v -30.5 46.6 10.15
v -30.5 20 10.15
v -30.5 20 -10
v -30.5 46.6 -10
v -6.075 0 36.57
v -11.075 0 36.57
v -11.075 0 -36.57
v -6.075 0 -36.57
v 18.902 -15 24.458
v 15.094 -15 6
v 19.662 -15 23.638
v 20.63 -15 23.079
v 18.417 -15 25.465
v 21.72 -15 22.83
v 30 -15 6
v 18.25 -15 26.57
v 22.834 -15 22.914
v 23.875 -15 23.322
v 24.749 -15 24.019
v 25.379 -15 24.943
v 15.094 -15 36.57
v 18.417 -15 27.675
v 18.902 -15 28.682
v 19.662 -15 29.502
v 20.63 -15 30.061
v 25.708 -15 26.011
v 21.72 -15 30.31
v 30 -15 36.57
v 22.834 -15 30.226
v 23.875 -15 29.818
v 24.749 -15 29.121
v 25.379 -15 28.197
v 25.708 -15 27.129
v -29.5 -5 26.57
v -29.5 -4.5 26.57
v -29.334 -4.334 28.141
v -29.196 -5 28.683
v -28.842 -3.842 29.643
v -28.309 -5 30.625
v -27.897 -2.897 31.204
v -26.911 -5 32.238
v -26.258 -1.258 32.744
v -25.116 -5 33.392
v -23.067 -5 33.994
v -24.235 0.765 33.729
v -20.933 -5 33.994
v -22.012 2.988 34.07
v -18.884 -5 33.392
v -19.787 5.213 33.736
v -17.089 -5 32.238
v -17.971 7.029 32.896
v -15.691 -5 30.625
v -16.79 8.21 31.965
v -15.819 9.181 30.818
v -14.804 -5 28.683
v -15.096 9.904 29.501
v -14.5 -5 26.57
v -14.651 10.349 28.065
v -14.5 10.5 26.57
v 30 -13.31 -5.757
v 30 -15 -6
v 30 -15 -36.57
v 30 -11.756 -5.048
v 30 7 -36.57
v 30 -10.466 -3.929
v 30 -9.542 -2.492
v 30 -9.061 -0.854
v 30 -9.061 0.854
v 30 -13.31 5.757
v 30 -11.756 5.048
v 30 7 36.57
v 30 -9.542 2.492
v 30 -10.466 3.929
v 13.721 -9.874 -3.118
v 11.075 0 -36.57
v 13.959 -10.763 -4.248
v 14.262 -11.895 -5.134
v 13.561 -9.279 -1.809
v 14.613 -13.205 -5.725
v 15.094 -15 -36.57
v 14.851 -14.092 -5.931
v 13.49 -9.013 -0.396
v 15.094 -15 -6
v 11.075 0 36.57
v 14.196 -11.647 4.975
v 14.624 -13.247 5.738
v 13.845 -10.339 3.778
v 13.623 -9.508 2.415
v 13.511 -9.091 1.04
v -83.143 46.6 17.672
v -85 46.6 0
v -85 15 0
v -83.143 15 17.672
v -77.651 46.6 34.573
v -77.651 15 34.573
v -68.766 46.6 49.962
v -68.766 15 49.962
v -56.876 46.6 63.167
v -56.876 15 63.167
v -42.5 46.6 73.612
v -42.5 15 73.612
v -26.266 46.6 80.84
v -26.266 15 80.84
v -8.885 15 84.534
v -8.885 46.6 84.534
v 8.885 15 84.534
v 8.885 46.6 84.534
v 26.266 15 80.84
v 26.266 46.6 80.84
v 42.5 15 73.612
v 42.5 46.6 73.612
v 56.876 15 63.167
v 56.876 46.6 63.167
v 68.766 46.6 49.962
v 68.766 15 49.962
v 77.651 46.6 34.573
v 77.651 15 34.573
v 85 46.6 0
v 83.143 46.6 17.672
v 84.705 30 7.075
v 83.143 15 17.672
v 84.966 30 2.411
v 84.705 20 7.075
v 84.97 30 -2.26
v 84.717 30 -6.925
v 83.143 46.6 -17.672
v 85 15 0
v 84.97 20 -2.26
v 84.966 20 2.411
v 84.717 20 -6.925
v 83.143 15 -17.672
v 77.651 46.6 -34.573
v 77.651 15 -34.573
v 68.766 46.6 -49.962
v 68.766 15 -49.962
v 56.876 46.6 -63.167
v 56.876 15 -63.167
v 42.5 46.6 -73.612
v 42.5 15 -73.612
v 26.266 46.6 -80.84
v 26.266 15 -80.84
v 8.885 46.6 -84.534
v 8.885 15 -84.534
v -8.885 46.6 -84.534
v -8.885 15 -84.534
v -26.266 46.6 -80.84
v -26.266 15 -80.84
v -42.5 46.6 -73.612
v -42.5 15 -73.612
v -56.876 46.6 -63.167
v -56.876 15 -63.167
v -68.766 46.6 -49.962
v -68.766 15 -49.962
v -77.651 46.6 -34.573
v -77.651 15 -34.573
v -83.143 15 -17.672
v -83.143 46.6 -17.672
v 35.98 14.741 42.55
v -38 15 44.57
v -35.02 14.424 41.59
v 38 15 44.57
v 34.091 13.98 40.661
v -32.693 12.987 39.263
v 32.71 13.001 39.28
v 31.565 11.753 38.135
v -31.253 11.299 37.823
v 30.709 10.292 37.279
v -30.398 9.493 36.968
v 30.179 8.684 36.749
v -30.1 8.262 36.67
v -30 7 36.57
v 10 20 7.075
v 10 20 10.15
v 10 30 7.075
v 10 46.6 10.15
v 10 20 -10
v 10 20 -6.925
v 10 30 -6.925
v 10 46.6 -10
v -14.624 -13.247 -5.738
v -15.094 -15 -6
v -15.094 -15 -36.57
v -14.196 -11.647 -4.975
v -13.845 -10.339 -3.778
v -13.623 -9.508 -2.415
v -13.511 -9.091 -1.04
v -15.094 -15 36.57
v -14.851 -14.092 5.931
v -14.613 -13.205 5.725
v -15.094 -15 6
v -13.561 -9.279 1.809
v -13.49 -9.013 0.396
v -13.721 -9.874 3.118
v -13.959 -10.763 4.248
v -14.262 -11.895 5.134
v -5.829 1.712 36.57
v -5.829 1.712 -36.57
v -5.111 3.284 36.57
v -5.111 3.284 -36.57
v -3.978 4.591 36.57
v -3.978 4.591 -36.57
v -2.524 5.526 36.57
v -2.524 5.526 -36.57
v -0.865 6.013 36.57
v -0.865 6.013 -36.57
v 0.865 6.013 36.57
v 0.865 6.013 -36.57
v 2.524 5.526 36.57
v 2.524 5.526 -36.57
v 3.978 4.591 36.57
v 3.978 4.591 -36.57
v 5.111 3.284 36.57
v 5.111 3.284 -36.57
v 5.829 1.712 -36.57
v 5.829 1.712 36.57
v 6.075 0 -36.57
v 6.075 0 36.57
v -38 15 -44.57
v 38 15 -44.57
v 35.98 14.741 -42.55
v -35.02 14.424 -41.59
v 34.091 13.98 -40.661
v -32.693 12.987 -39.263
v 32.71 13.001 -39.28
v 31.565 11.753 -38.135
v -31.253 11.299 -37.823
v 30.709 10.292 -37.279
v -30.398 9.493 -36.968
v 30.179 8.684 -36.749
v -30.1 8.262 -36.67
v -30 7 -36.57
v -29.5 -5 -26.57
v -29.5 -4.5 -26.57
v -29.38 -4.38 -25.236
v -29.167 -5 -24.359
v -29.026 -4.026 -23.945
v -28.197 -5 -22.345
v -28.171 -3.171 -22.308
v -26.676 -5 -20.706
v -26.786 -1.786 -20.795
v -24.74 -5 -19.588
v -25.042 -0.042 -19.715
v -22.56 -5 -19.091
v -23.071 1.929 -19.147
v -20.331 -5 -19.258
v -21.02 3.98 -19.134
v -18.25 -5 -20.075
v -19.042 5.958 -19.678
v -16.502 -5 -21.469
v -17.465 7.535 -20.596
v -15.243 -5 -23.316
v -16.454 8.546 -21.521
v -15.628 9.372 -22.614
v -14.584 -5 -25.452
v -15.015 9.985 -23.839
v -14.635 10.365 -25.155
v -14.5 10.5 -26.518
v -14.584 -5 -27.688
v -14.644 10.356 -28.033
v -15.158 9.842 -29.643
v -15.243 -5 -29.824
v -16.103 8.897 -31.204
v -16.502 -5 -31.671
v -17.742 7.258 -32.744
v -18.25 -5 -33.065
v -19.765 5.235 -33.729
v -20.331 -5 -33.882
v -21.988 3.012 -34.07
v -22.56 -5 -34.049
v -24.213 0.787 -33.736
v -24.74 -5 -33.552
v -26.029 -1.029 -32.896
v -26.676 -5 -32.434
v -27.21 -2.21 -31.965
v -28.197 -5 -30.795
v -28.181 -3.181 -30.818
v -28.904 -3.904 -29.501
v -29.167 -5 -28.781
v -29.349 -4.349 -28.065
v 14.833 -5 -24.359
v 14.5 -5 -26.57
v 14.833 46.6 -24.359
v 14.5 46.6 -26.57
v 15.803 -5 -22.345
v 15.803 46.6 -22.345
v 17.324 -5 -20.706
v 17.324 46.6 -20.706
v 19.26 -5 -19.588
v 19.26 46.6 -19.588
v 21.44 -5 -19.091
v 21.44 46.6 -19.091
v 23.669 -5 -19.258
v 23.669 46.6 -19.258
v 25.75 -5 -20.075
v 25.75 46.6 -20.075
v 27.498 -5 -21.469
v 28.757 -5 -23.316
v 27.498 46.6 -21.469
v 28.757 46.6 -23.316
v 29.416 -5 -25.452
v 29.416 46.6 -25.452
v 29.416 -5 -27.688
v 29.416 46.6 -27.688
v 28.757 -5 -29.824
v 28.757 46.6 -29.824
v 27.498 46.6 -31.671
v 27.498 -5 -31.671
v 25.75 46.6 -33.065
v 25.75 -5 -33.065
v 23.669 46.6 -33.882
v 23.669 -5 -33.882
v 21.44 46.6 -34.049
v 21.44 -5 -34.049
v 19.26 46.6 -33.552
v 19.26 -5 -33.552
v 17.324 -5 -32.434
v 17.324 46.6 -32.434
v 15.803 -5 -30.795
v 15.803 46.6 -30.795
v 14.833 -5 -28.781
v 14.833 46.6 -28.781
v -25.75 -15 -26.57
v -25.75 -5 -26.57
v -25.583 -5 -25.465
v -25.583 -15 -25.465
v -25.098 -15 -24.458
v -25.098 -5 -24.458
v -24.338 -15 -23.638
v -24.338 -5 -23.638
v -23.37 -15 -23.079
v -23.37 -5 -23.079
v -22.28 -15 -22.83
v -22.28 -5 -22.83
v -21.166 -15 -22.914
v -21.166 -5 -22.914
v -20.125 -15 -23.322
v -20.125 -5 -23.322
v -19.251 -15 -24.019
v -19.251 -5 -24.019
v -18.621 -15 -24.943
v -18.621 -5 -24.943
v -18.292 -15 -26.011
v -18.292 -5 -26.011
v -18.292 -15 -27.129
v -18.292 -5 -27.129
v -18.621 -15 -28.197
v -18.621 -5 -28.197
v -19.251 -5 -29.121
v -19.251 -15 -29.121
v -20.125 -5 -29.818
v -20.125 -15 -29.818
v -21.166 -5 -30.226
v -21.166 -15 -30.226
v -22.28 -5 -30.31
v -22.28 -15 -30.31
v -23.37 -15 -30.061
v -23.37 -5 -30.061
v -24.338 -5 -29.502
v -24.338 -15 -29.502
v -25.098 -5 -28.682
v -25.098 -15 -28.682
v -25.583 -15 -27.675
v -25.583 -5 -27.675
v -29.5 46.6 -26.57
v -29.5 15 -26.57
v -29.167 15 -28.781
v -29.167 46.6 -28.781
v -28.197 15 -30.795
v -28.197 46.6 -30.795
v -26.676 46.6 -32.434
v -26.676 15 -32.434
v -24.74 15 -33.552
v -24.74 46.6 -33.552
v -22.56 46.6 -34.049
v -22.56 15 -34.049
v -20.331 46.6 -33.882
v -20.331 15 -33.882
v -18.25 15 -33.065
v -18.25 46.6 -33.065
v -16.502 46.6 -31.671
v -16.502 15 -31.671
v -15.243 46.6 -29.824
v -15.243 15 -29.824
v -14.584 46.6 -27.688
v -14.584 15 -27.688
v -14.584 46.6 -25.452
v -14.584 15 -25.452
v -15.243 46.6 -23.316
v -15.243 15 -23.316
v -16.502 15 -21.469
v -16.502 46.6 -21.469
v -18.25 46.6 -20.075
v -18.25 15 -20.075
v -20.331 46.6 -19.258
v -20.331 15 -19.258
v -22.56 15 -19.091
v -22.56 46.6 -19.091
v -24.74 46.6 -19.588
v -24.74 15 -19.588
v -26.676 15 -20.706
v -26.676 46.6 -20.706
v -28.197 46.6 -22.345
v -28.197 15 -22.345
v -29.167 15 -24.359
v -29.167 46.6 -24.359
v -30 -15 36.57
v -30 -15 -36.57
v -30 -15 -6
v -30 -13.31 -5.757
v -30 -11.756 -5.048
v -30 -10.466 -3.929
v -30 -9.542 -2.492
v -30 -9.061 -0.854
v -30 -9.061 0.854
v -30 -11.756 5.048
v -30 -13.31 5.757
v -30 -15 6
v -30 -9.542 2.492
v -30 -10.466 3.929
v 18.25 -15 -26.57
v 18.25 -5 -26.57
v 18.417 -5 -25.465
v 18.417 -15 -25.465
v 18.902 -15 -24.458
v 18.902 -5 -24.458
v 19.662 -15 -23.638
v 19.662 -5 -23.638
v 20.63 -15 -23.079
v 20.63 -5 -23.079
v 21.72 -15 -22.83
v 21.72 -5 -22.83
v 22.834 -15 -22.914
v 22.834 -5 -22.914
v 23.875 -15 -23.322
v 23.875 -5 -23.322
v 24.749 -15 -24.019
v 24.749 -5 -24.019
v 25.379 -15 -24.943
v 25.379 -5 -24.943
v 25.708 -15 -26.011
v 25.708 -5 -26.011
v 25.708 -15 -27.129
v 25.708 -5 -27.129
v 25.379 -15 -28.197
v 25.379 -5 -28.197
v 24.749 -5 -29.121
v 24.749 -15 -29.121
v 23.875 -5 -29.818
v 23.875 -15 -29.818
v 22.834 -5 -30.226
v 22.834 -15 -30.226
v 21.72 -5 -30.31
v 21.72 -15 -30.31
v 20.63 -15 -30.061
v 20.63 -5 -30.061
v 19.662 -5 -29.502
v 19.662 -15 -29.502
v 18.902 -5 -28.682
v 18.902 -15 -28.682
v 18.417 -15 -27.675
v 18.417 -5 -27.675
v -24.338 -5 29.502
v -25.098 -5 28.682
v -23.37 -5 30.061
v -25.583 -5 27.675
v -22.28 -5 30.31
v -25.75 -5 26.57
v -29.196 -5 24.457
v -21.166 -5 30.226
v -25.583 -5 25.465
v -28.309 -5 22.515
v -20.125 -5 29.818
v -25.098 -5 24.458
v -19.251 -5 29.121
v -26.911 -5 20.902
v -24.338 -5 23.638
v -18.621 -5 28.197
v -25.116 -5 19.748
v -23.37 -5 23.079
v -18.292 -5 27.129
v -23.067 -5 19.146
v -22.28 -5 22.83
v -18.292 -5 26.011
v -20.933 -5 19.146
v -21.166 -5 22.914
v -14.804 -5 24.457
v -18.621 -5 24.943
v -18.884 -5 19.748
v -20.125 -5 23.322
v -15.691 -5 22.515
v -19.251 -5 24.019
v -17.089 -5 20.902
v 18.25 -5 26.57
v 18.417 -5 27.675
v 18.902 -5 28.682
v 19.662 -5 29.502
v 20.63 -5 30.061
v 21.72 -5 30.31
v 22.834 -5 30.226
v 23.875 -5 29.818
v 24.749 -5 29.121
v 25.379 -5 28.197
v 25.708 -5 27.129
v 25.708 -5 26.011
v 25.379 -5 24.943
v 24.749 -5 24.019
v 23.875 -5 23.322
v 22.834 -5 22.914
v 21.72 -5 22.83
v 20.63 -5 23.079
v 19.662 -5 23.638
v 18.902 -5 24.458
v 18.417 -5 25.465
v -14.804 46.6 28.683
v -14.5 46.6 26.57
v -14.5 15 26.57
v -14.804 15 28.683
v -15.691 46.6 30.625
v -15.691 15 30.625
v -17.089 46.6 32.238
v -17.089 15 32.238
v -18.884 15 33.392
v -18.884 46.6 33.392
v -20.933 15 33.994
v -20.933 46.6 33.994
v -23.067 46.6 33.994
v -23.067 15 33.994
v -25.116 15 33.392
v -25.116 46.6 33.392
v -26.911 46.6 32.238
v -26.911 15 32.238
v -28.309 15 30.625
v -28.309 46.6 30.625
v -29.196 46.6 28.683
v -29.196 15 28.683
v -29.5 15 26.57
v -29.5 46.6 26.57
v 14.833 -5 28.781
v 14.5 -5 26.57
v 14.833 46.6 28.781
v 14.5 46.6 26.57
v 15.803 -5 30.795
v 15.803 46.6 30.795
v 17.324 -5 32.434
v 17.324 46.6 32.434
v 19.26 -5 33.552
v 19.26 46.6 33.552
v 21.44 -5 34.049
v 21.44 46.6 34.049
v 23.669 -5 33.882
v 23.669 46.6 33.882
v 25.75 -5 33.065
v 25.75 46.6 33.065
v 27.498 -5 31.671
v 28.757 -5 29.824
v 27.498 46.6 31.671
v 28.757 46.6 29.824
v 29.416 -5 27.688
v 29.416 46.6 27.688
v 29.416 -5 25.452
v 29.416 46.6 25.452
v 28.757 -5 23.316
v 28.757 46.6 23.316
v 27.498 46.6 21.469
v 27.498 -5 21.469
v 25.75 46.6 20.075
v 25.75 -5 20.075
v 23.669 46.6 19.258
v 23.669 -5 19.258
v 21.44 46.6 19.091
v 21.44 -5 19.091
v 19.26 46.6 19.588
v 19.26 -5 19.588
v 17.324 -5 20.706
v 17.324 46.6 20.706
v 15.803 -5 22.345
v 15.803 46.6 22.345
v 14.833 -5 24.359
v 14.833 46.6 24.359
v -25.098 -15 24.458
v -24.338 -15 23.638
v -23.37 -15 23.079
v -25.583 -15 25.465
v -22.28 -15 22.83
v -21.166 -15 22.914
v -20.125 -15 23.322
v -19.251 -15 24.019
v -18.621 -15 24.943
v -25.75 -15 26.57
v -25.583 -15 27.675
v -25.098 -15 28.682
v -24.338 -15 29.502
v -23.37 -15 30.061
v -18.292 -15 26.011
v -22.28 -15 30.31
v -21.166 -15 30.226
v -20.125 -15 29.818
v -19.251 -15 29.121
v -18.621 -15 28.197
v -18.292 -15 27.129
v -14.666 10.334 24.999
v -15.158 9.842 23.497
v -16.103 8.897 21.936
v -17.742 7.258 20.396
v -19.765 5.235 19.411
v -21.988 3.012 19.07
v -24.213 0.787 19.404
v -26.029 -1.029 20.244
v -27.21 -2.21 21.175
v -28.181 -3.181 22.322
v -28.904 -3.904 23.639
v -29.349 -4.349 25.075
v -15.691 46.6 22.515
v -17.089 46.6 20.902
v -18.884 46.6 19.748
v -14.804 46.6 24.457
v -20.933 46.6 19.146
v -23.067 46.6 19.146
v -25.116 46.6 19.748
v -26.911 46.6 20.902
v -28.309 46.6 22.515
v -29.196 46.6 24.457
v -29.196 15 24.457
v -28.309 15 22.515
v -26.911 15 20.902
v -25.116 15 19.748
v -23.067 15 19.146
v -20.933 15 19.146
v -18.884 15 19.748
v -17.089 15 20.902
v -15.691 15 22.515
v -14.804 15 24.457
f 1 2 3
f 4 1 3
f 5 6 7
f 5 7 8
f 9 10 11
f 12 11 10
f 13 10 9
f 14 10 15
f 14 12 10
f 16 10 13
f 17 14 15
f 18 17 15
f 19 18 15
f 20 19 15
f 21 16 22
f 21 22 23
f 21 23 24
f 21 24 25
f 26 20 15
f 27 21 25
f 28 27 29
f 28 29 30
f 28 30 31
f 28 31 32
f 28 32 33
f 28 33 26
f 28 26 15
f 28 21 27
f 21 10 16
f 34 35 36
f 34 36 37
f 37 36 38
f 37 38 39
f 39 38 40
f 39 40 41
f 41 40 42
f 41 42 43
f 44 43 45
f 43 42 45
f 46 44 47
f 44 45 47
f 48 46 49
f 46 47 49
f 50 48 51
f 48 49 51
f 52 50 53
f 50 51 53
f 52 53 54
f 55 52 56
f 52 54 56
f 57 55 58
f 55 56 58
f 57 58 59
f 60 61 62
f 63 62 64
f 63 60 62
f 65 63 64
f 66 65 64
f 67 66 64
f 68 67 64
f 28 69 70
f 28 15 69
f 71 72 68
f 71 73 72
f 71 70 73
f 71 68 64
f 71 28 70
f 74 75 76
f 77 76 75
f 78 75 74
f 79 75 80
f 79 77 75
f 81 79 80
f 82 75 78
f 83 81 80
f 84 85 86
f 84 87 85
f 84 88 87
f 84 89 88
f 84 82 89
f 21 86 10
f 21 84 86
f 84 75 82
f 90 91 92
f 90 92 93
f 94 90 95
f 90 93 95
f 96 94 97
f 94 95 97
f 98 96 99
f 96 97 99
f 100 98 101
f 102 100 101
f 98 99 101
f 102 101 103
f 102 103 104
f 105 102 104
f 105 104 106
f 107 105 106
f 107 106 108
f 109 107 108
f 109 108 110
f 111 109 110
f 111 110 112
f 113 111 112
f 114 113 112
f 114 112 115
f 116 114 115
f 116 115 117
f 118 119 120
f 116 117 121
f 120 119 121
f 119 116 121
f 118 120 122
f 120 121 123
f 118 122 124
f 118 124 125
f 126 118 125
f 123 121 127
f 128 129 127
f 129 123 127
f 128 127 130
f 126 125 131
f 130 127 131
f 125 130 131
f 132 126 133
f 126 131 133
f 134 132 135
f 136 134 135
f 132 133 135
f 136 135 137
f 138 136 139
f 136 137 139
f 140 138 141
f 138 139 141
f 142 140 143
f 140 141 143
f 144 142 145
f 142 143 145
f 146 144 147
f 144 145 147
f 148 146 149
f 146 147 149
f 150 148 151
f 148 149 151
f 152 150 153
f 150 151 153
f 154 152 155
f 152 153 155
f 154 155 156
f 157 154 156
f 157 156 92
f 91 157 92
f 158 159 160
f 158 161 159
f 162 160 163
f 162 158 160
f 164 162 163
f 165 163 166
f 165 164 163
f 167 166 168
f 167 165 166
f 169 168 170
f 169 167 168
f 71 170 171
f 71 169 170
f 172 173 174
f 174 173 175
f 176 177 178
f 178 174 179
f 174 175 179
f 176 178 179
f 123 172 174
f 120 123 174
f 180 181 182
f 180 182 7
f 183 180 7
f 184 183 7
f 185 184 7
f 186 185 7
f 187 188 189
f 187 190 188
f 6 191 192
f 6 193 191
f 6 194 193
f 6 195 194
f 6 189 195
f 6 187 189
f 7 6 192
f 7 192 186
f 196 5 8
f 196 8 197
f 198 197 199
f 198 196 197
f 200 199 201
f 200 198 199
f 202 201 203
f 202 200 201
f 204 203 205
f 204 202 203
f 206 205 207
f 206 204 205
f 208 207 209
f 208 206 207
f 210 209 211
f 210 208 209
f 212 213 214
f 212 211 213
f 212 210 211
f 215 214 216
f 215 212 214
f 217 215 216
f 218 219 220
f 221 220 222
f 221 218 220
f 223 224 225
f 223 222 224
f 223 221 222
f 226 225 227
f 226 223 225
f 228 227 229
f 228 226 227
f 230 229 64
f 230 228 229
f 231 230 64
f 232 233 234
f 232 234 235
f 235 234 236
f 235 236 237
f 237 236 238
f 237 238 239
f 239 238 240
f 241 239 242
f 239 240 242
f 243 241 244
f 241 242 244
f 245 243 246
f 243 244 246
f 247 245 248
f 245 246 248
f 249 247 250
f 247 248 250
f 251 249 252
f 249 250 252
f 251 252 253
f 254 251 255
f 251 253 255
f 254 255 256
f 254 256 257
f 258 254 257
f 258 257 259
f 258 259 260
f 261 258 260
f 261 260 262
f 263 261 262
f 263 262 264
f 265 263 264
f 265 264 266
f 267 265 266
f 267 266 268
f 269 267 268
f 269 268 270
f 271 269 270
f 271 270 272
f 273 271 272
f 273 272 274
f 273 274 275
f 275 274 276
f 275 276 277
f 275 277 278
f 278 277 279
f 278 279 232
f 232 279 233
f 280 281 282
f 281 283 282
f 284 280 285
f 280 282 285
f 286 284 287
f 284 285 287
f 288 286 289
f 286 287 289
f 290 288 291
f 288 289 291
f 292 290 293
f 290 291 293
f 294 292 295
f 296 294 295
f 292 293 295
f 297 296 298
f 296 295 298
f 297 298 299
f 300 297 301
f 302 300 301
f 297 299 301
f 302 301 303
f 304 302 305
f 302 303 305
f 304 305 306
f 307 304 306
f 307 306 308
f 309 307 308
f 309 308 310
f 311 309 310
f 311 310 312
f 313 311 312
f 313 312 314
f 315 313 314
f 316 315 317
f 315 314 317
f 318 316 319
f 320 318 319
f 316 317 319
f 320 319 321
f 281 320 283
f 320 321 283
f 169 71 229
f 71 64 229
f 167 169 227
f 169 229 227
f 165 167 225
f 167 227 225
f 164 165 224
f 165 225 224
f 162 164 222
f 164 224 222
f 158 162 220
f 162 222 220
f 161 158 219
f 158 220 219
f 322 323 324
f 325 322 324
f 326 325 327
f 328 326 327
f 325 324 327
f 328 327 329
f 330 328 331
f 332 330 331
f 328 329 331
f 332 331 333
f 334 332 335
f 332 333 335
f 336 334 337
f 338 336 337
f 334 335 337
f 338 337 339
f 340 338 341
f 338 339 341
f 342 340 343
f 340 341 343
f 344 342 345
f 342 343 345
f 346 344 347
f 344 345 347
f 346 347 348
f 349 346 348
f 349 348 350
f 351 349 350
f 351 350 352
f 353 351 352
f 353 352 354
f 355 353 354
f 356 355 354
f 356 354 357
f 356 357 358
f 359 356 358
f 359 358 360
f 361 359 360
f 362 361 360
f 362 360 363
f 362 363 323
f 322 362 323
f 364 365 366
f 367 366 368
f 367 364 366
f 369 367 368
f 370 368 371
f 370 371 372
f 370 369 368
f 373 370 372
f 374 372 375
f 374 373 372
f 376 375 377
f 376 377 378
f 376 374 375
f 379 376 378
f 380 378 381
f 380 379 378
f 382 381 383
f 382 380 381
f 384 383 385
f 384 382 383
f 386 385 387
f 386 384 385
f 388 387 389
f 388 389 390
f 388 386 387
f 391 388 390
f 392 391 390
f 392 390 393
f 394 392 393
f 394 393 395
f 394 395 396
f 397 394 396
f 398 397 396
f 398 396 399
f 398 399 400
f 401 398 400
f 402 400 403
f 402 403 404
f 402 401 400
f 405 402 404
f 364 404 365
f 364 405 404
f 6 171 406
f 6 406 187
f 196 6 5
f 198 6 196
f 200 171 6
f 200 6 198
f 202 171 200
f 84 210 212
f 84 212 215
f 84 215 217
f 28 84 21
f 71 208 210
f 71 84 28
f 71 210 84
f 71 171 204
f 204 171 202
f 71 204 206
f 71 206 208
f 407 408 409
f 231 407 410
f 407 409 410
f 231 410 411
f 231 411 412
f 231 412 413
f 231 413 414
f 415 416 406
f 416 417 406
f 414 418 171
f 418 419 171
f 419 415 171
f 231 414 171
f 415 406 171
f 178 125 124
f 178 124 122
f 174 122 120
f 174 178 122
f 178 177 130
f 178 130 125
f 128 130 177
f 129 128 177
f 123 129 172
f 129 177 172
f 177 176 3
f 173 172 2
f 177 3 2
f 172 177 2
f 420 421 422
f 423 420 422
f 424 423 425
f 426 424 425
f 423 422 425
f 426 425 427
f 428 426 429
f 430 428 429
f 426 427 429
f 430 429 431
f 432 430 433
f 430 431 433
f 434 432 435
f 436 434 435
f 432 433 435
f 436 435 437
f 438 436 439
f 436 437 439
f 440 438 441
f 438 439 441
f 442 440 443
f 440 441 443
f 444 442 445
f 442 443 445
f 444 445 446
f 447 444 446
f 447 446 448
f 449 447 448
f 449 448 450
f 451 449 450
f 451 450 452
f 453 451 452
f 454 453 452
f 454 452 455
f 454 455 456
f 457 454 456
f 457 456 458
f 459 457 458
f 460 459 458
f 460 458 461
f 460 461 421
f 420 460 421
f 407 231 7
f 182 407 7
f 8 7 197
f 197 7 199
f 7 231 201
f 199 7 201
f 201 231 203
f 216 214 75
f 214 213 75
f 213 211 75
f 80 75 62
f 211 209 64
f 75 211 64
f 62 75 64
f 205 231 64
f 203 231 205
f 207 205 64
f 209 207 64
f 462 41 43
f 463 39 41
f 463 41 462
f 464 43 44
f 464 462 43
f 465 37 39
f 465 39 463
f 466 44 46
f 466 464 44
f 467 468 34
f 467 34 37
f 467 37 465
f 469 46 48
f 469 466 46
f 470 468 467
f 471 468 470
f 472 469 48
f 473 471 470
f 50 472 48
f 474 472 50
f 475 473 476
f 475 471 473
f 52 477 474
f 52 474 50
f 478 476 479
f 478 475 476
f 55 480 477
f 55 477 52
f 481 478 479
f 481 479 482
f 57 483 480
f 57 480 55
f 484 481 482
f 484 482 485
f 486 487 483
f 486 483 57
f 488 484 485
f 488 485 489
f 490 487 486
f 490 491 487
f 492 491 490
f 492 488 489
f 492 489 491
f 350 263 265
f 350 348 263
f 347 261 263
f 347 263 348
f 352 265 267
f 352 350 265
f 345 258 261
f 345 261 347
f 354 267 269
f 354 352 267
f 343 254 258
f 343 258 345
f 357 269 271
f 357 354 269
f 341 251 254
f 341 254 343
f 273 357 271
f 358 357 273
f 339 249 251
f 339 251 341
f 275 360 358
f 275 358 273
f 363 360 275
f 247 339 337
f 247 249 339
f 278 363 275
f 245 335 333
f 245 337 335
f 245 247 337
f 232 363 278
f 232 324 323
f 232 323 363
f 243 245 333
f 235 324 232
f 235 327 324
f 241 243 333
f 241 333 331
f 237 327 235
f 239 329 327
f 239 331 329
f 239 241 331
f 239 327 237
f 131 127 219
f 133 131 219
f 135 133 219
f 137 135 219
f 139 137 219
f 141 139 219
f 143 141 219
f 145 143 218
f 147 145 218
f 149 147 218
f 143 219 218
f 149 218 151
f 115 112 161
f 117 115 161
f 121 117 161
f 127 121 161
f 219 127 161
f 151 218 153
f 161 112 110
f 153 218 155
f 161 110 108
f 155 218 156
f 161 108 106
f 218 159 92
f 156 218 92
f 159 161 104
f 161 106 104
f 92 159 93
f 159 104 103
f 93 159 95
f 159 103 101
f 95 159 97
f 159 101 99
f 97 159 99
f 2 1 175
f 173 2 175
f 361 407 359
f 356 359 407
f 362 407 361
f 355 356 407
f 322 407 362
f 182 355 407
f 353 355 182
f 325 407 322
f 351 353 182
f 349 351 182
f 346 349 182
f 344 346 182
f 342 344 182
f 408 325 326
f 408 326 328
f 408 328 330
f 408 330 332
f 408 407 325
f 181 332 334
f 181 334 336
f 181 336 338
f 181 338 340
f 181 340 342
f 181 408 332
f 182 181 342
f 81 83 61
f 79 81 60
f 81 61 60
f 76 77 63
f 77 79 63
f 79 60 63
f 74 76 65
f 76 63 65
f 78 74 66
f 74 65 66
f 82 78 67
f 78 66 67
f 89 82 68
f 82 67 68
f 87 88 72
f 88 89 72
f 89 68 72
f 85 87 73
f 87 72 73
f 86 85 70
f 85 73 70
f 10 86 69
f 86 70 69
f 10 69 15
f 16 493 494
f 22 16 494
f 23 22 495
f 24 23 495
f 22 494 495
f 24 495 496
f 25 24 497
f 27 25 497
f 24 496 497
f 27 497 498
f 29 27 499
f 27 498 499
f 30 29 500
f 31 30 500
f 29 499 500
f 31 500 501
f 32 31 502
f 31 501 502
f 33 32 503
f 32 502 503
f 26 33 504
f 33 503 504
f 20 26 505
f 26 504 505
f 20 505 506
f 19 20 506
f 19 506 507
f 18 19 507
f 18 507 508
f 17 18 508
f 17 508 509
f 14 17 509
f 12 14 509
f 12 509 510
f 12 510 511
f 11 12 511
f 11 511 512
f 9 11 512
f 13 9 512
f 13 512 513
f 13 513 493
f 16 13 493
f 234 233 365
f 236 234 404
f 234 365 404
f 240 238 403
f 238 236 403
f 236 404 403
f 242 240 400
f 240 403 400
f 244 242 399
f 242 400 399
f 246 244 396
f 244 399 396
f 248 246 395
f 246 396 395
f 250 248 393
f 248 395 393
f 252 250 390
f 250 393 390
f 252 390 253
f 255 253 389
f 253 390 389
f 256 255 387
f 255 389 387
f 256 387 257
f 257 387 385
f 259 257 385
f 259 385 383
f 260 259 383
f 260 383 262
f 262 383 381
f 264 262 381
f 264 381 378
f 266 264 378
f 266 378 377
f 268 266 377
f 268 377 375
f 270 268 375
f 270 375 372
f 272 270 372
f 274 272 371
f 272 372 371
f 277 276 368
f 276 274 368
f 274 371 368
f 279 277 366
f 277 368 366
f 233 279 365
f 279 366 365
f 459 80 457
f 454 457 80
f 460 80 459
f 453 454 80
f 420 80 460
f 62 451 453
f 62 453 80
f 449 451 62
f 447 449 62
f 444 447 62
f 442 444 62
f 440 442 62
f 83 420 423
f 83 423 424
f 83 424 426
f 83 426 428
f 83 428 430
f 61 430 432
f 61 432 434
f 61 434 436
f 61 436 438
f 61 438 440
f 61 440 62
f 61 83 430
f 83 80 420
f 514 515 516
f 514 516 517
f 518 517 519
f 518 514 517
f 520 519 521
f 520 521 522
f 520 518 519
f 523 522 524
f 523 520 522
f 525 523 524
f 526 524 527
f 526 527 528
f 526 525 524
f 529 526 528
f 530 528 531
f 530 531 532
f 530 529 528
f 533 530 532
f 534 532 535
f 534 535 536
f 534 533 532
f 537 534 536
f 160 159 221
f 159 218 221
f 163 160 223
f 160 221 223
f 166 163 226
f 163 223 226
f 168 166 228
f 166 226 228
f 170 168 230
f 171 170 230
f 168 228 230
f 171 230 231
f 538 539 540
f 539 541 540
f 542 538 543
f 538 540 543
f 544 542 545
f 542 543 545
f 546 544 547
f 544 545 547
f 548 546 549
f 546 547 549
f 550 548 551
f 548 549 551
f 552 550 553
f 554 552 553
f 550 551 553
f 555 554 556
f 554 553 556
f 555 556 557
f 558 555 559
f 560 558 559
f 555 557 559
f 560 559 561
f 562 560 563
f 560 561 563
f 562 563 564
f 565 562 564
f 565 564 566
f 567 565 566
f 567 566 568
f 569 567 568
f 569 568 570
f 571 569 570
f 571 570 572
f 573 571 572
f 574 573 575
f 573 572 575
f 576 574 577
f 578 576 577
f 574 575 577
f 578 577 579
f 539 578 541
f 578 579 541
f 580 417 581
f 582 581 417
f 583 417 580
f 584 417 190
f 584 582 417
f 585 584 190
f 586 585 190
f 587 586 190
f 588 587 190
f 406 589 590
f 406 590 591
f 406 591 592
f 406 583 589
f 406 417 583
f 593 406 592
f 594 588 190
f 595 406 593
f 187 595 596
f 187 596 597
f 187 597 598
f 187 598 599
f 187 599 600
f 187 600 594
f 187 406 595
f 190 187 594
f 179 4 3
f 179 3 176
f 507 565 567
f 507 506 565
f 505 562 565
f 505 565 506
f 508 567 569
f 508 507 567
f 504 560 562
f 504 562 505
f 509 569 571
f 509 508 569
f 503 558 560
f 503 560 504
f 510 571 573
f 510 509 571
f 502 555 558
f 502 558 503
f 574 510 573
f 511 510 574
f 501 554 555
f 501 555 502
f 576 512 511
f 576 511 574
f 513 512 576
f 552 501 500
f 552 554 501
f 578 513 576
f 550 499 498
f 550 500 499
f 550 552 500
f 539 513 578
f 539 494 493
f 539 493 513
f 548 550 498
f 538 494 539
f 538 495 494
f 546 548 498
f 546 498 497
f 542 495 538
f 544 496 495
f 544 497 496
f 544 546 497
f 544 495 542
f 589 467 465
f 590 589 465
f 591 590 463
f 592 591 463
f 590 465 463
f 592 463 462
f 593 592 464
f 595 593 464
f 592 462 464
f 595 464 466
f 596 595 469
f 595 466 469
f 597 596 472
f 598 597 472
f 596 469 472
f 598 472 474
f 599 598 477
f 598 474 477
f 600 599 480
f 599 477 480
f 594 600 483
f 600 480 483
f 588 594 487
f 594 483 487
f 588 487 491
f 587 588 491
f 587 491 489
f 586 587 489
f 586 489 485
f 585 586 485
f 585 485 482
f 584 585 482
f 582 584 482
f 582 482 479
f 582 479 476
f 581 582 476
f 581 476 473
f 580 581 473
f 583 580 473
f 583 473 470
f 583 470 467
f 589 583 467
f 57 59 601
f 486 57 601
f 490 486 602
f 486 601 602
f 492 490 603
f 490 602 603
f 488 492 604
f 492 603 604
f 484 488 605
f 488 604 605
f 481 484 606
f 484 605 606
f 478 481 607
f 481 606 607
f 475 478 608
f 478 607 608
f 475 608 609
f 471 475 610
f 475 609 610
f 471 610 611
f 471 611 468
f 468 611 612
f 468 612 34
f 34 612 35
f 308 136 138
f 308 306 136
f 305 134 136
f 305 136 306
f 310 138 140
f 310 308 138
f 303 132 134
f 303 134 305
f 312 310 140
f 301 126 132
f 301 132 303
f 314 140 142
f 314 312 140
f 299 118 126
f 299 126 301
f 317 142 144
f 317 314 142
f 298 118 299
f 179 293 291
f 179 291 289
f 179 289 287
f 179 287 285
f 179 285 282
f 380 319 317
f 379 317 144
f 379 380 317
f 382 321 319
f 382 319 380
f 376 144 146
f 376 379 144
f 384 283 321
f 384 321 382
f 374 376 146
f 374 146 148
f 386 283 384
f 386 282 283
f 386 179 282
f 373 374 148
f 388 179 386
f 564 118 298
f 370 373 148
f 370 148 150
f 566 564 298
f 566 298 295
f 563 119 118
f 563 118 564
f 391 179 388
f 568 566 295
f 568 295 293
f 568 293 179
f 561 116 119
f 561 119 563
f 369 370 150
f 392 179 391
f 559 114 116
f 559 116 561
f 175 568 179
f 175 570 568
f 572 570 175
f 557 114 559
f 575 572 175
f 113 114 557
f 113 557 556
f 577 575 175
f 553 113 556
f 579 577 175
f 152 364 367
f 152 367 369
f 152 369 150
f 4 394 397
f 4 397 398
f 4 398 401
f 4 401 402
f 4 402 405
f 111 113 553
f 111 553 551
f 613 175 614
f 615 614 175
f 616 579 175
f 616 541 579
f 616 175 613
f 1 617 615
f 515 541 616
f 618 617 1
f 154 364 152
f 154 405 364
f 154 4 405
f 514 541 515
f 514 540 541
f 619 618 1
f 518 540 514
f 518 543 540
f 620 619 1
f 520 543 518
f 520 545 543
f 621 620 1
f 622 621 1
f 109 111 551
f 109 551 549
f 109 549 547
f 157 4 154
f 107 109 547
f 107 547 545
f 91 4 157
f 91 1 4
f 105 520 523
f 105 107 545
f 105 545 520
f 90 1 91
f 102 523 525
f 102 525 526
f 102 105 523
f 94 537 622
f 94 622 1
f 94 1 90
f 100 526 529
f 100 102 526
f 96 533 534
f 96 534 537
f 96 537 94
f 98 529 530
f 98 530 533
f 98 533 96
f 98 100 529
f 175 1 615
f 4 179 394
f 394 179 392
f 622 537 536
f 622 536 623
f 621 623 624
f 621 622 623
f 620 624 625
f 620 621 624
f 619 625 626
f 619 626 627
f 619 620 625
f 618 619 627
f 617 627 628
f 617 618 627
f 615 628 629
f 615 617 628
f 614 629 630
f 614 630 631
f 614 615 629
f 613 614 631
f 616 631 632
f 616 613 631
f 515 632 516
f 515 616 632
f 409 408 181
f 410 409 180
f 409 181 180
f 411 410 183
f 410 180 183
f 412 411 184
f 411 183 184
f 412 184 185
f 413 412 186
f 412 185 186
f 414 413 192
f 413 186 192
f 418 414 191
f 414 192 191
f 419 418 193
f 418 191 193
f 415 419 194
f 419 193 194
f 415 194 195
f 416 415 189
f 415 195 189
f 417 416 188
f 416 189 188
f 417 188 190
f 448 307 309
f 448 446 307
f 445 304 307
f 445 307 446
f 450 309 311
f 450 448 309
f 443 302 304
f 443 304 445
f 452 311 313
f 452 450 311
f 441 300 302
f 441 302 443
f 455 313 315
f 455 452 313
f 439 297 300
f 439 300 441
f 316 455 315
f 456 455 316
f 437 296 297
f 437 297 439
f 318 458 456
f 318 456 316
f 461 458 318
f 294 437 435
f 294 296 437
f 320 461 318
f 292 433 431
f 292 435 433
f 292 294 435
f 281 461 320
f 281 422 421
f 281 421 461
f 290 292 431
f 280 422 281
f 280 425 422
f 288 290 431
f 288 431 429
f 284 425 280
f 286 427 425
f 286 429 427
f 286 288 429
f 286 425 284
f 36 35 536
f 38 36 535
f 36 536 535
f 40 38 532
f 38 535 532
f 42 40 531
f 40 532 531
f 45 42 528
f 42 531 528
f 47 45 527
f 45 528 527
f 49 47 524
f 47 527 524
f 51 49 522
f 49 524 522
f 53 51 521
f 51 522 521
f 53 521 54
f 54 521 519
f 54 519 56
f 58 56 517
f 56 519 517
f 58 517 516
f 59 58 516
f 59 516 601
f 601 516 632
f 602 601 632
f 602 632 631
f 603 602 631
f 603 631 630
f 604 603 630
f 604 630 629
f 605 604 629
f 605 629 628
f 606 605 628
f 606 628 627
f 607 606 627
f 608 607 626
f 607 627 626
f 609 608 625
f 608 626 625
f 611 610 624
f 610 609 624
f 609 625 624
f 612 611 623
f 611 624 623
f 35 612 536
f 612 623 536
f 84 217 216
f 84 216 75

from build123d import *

# Parameters (mm, degrees)
SKETCH1_W           = 60
SKETCH1_H           = 30
BOSS_EXTRUDE1_DEPTH = 36.57
CUT_EXTRUDE1_DEPTH  = 60
CUT_EXTRUDE2_REACH  = 82.464
CUT_EXTRUDE3_DEPTH  = 73.14
SKETCH5_R           = 3.75
CUT_EXTRUDE4_DEPTH  = 30
SKETCH6_R           = 7.5
CUT_EXTRUDE5_DEPTH  = 20
SKETCH8_R           = 85
BOSS_EXTRUDE3_DEPTH = 31.6
CUT_EXTRUDE6_START  = -31.6
SKETCH9_R           = 7.5
CUT_EXTRUDE6_DEPTH  = 31.6
SKETCH11_W          = 40.5
SKETCH11_H          = 20.15
CUT_EXTRUDE7_DEPTH  = 26.6
BOSS_EXTRUDE4_DEPTH = 73.14
SKETCH13_R          = 7.5
CUT_EXTRUDE8_DEPTH  = 51.6
FILLET1_R           = 8
SKETCH14_W          = 14
SKETCH14_H          = 10
CUT_EXTRUDE9_DEPTH  = 84


with BuildPart() as part:
    # Sketch1 → Boss-Extrude1 (new, symmetric)
    with BuildSketch(Plane.XY):
        Rectangle(SKETCH1_W, SKETCH1_H)
    extrude(amount=BOSS_EXTRUDE1_DEPTH, both=True)

    # Sketch2 → Cut-Extrude1 (cut)
    with BuildSketch(Plane(origin=(30, 0, 0), x_dir=(0, 0, -1), z_dir=(1, 0, 0))):
        with BuildLine():
            ThreePointArc((6, -15), (0, -9), (-6, -15))
            Line((-6, -15), (6, -15))
        make_face()
    extrude(amount=-CUT_EXTRUDE1_DEPTH, mode=Mode.SUBTRACT)

    # Cut-Extrude2: up to this face of the body (flat: up to its plane)
    cut_extrude2_end = Plane(part.part.faces().sort_by_distance((0, 0, -36.57))[0])
    # Sketch3 → Cut-Extrude2 (cut, up to the picked face)
    with BuildSketch(Plane.XY.offset(36.57), mode=Mode.PRIVATE) as cut_extrude2_sk1:
        with BuildLine():
            Line((6.075, 0), (11.075, 0))
            Line((11.075, 0), (15.094237886, -15))
            Line((15.094237886, -15), (-15.094237886, -15))
            Line((-15.094237886, -15), (-11.075, 0))
            Line((-11.075, 0), (-6.075, 0))
            ThreePointArc((-6.075, 0), (0, 6.075), (6.075, 0))
        make_face()
    cut_extrude2_tool1 = split(extrude(cut_extrude2_sk1.sketch, amount=-CUT_EXTRUDE2_REACH, mode=Mode.PRIVATE), bisect_by=cut_extrude2_end, keep=Keep.BOTH, mode=Mode.PRIVATE)
    add(cut_extrude2_tool1.solids().sort_by(Axis((0, -6.537689, 36.57), (0, 0, -1)))[0], mode=Mode.SUBTRACT)

    # Sketch4 → Cut-Extrude3 (cut)
    with BuildSketch(Plane.XY.offset(36.57)):
        Polygon((30, 15), (30, -5), (10, 15), align=None)
        Polygon((-30, 15), (-30, -5), (-10, 15), align=None)
    extrude(amount=-CUT_EXTRUDE3_DEPTH, mode=Mode.SUBTRACT)

    # Sketch5 → Cut-Extrude4 (cut)
    with BuildSketch(Plane(origin=(0, 15, 0), x_dir=(1, 0, 0), z_dir=(0, 1, 0))):
        with Locations(Location((22, -26.57, 0), (0, 0, 180))):
            Circle(SKETCH5_R)
        with Locations(Location((-22, -26.57, 0), (0, 0, 180))):
            Circle(SKETCH5_R)
        with Locations(Location((22, 26.57, 0), (0, 0, 180))):
            Circle(SKETCH5_R)
        with Locations(Location((-22, 26.57, 0), (0, 0, 180))):
            Circle(SKETCH5_R)
    extrude(amount=-CUT_EXTRUDE4_DEPTH, mode=Mode.SUBTRACT)

    # Sketch6 → Cut-Extrude5 (cut)
    with BuildSketch(Plane(origin=(0, 15, 0), x_dir=(1, 0, 0), z_dir=(0, 1, 0))):
        with Locations(Location((22, -26.57, 0), (0, 0, 180))):
            Circle(SKETCH6_R)
        with Locations((-22, -26.57)):
            Circle(SKETCH6_R)
        with Locations(Location((22, 26.57, 0), (0, 0, 180))):
            Circle(SKETCH6_R)
        with Locations(Location((-22, 26.57, 0), (0, 0, 180))):
            Circle(SKETCH6_R)
    extrude(amount=-CUT_EXTRUDE5_DEPTH, mode=Mode.SUBTRACT)

    # Sketch8 → Boss-Extrude3 (add)
    with BuildSketch(Plane(origin=(0, 15, 0), x_dir=(1, 0, 0), z_dir=(0, 1, 0))):
        with Locations(Location((0, 0, 0), (0, 0, 180))):
            Circle(SKETCH8_R)
    extrude(amount=BOSS_EXTRUDE3_DEPTH)

    # Sketch9 → Cut-Extrude6 (cut)
    with BuildSketch(Plane.XZ.offset(-15).offset(CUT_EXTRUDE6_START)):
        with Locations(Location((22, 26.57, 0), (0, 0, 180))):
            Circle(SKETCH9_R)
        with Locations(Location((22, -26.57, 0), (0, 0, 180))):
            Circle(SKETCH9_R)
        with Locations(Location((-22, -26.57, 0), (0, 0, 180))):
            Circle(SKETCH9_R)
        with Locations((-22, 26.57)):
            Circle(SKETCH9_R)
    extrude(amount=CUT_EXTRUDE6_DEPTH, mode=Mode.SUBTRACT)

    # Sketch11 → Cut-Extrude7 (cut)
    with BuildSketch(Plane(origin=(0, 46.6, 0), x_dir=(1, 0, 0), z_dir=(0, 1, 0))):
        with Locations((-10.25, -0.075)):
            Rectangle(SKETCH11_W, SKETCH11_H)
    extrude(amount=-CUT_EXTRUDE7_DEPTH, mode=Mode.SUBTRACT)

    # Sketch12 → Boss-Extrude4 (add)
    with BuildSketch(Plane.XY.offset(36.57)):
        Polygon((30, -5), (30, 15), (10, 15), align=None)
        Polygon((-10, 15), (-30, -5), (-30, 15), align=None)
    extrude(amount=-BOSS_EXTRUDE4_DEPTH)

    # Sketch13 → Cut-Extrude8 (cut)
    with BuildSketch(Plane(origin=(0, 46.6, 0), x_dir=(1, 0, 0), z_dir=(0, 1, 0))):
        with Locations(Location((22, 26.57, 0), (0, 0, 180))):
            Circle(SKETCH13_R)
        with Locations(Location((-22, 26.57, 0), (0, 0, 180))):
            Circle(SKETCH13_R)
        with Locations(Location((-22, -26.57, 0), (0, 0, 180))):
            Circle(SKETCH13_R)
        with Locations(Location((22, -26.57, 0), (0, 0, 180))):
            Circle(SKETCH13_R)
    extrude(amount=-CUT_EXTRUDE8_DEPTH, mode=Mode.SUBTRACT)

    # Fillet1
    fillet1_edges = [part.edges().sort_by_distance(p)[0] for p in [
        (30, 15, 0),
        (-30, 15, 0),
        (0, 15, -36.57),
        (0, 15, 36.57),
    ]]
    fillet(fillet1_edges, radius=FILLET1_R)

    # Sketch14 → Cut-Extrude9 (cut)
    with BuildSketch(Plane.ZY.offset(-10)):
        with Locations((0.075, 25)):
            Rectangle(SKETCH14_W, SKETCH14_H)
    extrude(amount=-CUT_EXTRUDE9_DEPTH, mode=Mode.SUBTRACT)


solid = part.part
